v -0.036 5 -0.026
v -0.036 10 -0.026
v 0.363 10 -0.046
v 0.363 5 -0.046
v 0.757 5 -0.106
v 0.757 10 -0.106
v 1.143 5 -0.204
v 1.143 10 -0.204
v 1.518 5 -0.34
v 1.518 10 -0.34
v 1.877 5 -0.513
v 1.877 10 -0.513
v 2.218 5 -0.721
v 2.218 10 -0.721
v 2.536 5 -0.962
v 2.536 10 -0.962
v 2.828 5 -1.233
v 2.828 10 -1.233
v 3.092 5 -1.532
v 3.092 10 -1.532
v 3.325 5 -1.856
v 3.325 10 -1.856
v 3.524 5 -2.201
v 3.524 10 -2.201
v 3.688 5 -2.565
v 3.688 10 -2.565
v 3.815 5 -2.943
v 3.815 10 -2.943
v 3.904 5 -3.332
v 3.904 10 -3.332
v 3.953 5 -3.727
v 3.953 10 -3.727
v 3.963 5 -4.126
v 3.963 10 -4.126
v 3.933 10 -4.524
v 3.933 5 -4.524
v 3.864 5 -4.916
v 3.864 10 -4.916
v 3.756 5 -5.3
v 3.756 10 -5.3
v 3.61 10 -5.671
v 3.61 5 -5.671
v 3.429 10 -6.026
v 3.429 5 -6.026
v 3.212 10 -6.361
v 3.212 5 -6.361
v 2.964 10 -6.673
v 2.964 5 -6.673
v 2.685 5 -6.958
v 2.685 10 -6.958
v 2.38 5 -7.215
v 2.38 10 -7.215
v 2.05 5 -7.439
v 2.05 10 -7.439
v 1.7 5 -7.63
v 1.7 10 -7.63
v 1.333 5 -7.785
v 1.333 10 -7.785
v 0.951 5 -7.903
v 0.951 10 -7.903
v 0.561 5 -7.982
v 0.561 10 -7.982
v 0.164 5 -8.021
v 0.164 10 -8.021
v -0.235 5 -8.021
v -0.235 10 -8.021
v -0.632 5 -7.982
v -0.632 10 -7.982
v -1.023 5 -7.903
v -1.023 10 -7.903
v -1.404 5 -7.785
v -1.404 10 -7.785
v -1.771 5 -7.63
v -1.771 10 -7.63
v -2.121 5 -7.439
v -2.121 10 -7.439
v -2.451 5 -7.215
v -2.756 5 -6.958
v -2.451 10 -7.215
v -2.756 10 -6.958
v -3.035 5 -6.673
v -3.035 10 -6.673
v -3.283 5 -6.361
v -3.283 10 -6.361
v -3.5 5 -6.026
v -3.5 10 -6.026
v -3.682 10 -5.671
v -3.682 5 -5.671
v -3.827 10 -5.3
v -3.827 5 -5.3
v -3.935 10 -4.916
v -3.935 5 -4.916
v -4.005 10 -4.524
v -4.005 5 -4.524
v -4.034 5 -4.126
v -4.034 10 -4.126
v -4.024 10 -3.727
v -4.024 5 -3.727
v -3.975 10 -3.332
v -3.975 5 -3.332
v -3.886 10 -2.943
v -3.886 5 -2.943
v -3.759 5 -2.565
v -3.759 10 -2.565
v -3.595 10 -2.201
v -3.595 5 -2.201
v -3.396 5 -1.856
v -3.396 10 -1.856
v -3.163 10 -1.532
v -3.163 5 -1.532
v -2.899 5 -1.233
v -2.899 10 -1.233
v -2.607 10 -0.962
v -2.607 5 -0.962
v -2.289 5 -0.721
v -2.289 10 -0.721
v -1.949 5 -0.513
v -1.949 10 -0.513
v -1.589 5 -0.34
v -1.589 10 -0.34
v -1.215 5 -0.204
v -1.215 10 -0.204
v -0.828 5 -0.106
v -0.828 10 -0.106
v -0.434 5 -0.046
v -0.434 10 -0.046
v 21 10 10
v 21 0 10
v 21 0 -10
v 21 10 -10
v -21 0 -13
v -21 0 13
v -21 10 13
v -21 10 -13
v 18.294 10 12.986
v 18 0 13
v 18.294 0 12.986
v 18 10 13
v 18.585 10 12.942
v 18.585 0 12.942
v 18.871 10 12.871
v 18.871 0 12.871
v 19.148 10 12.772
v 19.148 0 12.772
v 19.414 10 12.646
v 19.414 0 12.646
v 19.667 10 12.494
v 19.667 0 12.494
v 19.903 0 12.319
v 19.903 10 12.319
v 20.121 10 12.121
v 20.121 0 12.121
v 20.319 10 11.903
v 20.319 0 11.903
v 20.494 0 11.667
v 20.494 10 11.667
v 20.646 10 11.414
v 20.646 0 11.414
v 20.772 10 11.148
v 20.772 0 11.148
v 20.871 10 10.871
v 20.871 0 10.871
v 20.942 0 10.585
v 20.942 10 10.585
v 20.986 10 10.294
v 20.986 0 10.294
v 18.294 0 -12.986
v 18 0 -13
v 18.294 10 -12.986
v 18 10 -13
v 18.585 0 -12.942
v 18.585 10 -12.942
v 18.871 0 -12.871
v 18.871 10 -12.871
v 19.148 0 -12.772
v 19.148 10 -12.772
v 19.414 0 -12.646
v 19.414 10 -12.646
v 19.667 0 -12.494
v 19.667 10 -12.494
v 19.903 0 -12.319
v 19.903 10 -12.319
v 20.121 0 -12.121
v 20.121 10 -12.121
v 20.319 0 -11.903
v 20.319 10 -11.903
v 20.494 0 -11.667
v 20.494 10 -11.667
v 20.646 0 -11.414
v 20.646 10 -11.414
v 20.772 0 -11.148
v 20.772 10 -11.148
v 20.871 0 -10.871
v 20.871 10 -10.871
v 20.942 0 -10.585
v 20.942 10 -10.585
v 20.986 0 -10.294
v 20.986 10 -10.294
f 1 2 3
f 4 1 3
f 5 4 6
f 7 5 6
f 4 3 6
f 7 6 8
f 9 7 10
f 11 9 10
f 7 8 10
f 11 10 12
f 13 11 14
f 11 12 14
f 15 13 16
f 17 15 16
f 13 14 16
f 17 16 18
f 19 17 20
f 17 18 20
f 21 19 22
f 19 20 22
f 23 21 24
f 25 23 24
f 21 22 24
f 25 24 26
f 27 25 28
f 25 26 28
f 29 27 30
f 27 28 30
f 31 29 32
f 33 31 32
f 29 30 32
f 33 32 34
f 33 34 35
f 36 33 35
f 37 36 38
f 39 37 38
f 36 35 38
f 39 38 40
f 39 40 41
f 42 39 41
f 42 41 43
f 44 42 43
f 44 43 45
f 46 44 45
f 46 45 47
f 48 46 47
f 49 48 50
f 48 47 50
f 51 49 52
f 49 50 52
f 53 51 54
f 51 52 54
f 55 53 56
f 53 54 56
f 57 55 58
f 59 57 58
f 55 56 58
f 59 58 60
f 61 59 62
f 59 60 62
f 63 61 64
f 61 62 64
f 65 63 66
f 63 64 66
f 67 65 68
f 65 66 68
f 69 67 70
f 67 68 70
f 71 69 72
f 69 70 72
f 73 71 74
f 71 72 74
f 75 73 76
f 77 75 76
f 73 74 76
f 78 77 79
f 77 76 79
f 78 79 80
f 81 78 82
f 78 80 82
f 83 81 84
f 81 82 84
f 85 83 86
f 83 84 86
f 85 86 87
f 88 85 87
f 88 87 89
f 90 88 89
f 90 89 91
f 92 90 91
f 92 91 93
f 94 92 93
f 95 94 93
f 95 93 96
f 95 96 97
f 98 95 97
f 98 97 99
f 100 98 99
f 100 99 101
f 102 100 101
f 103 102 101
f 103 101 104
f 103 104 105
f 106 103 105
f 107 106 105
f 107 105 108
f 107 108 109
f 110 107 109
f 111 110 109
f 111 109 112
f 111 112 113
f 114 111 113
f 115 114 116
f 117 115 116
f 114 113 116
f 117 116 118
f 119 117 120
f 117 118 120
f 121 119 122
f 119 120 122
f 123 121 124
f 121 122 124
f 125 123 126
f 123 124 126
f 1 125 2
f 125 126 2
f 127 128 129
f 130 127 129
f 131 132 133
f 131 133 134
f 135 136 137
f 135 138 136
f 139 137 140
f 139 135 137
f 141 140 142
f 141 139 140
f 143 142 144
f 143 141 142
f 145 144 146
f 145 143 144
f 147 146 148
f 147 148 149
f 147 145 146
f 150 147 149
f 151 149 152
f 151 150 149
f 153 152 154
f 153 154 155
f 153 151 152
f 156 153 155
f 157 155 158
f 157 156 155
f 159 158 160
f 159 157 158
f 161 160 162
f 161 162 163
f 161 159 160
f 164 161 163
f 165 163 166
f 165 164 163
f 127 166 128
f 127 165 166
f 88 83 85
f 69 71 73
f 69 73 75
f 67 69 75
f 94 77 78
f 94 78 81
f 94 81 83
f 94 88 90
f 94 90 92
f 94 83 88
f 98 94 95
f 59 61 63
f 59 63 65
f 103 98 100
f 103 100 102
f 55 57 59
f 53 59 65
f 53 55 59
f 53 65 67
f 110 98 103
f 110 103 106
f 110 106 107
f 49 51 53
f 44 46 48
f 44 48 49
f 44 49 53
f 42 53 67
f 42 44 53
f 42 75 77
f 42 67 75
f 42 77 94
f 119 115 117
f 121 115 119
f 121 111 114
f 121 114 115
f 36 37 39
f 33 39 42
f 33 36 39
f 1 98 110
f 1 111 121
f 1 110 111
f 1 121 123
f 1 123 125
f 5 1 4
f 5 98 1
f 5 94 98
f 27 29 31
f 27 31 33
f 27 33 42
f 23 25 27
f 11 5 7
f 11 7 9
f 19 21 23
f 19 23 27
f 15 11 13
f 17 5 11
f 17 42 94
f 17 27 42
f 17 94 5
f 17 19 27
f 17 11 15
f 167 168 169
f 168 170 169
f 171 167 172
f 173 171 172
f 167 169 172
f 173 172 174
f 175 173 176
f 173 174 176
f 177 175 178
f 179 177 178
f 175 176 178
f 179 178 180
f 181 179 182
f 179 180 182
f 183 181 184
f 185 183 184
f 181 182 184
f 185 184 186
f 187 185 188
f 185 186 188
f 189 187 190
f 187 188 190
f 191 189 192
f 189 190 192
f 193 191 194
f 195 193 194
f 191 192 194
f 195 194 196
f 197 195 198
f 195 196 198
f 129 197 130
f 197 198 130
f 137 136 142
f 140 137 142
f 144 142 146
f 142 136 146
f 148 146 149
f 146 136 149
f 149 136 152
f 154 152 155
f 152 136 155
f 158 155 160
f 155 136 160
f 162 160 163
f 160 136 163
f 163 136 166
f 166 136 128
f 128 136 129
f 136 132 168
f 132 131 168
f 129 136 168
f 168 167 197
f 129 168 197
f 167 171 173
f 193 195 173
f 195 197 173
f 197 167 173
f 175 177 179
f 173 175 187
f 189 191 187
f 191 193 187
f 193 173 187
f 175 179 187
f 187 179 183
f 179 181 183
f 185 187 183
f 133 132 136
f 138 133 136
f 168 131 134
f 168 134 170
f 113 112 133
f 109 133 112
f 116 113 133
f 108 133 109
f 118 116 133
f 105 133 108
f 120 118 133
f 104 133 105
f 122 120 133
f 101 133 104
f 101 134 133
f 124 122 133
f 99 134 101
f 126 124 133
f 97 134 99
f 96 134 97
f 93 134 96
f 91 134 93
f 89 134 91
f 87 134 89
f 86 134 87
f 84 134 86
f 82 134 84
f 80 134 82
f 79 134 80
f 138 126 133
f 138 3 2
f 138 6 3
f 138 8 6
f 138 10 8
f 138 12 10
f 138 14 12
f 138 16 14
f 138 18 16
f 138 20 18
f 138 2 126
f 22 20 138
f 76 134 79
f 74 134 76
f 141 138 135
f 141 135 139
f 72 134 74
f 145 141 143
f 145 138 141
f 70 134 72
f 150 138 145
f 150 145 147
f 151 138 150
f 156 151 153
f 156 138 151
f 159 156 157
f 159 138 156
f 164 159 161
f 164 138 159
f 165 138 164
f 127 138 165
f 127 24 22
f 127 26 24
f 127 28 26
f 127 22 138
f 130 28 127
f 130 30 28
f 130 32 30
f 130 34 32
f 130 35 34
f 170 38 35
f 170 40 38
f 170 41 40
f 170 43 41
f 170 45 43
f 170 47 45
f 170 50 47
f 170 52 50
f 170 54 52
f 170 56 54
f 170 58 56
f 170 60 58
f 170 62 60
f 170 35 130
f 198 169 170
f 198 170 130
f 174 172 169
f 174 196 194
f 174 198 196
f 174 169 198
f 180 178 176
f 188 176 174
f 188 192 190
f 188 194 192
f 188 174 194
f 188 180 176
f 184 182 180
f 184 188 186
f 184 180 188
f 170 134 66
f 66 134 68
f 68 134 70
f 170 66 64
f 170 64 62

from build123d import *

# Parameters (mm, degrees)
SKETCH_1_W          = 42
SKETCH_1_H          = 26
EXTRUDE_1_DEPTH     = 10
SKETCH_2_R          = 4
CUT_EXTRUDE_1_DEPTH = 5
FILLET_1_R          = 3


with BuildPart() as part:
    # 草图1 → 凸台-拉伸1 (new body)
    with BuildSketch(Plane(origin=(0, 0, 0), x_dir=(1, 0, 0), z_dir=(0, 1, 0))):
        Rectangle(SKETCH_1_W, SKETCH_1_H)
    extrude(amount=EXTRUDE_1_DEPTH)

    # 草图2 → 切除-拉伸1 (cut)
    with BuildSketch(Plane(origin=(0, 10, 0), x_dir=(1, 0, 0), z_dir=(0, 1, 0))):
        with Locations(Location((-0.035567837, 4.026194604, 0), (0, 0, 270))):
            Circle(SKETCH_2_R)
    extrude(amount=-CUT_EXTRUDE_1_DEPTH, mode=Mode.SUBTRACT)

    # 圆角1
    fillet_1_edges = [part.edges().sort_by_distance(p)[0] for p in [
        (21, 5, 13),
        (21, 5, -13),
    ]]
    fillet(fillet_1_edges, radius=FILLET_1_R)


solid = part.part
